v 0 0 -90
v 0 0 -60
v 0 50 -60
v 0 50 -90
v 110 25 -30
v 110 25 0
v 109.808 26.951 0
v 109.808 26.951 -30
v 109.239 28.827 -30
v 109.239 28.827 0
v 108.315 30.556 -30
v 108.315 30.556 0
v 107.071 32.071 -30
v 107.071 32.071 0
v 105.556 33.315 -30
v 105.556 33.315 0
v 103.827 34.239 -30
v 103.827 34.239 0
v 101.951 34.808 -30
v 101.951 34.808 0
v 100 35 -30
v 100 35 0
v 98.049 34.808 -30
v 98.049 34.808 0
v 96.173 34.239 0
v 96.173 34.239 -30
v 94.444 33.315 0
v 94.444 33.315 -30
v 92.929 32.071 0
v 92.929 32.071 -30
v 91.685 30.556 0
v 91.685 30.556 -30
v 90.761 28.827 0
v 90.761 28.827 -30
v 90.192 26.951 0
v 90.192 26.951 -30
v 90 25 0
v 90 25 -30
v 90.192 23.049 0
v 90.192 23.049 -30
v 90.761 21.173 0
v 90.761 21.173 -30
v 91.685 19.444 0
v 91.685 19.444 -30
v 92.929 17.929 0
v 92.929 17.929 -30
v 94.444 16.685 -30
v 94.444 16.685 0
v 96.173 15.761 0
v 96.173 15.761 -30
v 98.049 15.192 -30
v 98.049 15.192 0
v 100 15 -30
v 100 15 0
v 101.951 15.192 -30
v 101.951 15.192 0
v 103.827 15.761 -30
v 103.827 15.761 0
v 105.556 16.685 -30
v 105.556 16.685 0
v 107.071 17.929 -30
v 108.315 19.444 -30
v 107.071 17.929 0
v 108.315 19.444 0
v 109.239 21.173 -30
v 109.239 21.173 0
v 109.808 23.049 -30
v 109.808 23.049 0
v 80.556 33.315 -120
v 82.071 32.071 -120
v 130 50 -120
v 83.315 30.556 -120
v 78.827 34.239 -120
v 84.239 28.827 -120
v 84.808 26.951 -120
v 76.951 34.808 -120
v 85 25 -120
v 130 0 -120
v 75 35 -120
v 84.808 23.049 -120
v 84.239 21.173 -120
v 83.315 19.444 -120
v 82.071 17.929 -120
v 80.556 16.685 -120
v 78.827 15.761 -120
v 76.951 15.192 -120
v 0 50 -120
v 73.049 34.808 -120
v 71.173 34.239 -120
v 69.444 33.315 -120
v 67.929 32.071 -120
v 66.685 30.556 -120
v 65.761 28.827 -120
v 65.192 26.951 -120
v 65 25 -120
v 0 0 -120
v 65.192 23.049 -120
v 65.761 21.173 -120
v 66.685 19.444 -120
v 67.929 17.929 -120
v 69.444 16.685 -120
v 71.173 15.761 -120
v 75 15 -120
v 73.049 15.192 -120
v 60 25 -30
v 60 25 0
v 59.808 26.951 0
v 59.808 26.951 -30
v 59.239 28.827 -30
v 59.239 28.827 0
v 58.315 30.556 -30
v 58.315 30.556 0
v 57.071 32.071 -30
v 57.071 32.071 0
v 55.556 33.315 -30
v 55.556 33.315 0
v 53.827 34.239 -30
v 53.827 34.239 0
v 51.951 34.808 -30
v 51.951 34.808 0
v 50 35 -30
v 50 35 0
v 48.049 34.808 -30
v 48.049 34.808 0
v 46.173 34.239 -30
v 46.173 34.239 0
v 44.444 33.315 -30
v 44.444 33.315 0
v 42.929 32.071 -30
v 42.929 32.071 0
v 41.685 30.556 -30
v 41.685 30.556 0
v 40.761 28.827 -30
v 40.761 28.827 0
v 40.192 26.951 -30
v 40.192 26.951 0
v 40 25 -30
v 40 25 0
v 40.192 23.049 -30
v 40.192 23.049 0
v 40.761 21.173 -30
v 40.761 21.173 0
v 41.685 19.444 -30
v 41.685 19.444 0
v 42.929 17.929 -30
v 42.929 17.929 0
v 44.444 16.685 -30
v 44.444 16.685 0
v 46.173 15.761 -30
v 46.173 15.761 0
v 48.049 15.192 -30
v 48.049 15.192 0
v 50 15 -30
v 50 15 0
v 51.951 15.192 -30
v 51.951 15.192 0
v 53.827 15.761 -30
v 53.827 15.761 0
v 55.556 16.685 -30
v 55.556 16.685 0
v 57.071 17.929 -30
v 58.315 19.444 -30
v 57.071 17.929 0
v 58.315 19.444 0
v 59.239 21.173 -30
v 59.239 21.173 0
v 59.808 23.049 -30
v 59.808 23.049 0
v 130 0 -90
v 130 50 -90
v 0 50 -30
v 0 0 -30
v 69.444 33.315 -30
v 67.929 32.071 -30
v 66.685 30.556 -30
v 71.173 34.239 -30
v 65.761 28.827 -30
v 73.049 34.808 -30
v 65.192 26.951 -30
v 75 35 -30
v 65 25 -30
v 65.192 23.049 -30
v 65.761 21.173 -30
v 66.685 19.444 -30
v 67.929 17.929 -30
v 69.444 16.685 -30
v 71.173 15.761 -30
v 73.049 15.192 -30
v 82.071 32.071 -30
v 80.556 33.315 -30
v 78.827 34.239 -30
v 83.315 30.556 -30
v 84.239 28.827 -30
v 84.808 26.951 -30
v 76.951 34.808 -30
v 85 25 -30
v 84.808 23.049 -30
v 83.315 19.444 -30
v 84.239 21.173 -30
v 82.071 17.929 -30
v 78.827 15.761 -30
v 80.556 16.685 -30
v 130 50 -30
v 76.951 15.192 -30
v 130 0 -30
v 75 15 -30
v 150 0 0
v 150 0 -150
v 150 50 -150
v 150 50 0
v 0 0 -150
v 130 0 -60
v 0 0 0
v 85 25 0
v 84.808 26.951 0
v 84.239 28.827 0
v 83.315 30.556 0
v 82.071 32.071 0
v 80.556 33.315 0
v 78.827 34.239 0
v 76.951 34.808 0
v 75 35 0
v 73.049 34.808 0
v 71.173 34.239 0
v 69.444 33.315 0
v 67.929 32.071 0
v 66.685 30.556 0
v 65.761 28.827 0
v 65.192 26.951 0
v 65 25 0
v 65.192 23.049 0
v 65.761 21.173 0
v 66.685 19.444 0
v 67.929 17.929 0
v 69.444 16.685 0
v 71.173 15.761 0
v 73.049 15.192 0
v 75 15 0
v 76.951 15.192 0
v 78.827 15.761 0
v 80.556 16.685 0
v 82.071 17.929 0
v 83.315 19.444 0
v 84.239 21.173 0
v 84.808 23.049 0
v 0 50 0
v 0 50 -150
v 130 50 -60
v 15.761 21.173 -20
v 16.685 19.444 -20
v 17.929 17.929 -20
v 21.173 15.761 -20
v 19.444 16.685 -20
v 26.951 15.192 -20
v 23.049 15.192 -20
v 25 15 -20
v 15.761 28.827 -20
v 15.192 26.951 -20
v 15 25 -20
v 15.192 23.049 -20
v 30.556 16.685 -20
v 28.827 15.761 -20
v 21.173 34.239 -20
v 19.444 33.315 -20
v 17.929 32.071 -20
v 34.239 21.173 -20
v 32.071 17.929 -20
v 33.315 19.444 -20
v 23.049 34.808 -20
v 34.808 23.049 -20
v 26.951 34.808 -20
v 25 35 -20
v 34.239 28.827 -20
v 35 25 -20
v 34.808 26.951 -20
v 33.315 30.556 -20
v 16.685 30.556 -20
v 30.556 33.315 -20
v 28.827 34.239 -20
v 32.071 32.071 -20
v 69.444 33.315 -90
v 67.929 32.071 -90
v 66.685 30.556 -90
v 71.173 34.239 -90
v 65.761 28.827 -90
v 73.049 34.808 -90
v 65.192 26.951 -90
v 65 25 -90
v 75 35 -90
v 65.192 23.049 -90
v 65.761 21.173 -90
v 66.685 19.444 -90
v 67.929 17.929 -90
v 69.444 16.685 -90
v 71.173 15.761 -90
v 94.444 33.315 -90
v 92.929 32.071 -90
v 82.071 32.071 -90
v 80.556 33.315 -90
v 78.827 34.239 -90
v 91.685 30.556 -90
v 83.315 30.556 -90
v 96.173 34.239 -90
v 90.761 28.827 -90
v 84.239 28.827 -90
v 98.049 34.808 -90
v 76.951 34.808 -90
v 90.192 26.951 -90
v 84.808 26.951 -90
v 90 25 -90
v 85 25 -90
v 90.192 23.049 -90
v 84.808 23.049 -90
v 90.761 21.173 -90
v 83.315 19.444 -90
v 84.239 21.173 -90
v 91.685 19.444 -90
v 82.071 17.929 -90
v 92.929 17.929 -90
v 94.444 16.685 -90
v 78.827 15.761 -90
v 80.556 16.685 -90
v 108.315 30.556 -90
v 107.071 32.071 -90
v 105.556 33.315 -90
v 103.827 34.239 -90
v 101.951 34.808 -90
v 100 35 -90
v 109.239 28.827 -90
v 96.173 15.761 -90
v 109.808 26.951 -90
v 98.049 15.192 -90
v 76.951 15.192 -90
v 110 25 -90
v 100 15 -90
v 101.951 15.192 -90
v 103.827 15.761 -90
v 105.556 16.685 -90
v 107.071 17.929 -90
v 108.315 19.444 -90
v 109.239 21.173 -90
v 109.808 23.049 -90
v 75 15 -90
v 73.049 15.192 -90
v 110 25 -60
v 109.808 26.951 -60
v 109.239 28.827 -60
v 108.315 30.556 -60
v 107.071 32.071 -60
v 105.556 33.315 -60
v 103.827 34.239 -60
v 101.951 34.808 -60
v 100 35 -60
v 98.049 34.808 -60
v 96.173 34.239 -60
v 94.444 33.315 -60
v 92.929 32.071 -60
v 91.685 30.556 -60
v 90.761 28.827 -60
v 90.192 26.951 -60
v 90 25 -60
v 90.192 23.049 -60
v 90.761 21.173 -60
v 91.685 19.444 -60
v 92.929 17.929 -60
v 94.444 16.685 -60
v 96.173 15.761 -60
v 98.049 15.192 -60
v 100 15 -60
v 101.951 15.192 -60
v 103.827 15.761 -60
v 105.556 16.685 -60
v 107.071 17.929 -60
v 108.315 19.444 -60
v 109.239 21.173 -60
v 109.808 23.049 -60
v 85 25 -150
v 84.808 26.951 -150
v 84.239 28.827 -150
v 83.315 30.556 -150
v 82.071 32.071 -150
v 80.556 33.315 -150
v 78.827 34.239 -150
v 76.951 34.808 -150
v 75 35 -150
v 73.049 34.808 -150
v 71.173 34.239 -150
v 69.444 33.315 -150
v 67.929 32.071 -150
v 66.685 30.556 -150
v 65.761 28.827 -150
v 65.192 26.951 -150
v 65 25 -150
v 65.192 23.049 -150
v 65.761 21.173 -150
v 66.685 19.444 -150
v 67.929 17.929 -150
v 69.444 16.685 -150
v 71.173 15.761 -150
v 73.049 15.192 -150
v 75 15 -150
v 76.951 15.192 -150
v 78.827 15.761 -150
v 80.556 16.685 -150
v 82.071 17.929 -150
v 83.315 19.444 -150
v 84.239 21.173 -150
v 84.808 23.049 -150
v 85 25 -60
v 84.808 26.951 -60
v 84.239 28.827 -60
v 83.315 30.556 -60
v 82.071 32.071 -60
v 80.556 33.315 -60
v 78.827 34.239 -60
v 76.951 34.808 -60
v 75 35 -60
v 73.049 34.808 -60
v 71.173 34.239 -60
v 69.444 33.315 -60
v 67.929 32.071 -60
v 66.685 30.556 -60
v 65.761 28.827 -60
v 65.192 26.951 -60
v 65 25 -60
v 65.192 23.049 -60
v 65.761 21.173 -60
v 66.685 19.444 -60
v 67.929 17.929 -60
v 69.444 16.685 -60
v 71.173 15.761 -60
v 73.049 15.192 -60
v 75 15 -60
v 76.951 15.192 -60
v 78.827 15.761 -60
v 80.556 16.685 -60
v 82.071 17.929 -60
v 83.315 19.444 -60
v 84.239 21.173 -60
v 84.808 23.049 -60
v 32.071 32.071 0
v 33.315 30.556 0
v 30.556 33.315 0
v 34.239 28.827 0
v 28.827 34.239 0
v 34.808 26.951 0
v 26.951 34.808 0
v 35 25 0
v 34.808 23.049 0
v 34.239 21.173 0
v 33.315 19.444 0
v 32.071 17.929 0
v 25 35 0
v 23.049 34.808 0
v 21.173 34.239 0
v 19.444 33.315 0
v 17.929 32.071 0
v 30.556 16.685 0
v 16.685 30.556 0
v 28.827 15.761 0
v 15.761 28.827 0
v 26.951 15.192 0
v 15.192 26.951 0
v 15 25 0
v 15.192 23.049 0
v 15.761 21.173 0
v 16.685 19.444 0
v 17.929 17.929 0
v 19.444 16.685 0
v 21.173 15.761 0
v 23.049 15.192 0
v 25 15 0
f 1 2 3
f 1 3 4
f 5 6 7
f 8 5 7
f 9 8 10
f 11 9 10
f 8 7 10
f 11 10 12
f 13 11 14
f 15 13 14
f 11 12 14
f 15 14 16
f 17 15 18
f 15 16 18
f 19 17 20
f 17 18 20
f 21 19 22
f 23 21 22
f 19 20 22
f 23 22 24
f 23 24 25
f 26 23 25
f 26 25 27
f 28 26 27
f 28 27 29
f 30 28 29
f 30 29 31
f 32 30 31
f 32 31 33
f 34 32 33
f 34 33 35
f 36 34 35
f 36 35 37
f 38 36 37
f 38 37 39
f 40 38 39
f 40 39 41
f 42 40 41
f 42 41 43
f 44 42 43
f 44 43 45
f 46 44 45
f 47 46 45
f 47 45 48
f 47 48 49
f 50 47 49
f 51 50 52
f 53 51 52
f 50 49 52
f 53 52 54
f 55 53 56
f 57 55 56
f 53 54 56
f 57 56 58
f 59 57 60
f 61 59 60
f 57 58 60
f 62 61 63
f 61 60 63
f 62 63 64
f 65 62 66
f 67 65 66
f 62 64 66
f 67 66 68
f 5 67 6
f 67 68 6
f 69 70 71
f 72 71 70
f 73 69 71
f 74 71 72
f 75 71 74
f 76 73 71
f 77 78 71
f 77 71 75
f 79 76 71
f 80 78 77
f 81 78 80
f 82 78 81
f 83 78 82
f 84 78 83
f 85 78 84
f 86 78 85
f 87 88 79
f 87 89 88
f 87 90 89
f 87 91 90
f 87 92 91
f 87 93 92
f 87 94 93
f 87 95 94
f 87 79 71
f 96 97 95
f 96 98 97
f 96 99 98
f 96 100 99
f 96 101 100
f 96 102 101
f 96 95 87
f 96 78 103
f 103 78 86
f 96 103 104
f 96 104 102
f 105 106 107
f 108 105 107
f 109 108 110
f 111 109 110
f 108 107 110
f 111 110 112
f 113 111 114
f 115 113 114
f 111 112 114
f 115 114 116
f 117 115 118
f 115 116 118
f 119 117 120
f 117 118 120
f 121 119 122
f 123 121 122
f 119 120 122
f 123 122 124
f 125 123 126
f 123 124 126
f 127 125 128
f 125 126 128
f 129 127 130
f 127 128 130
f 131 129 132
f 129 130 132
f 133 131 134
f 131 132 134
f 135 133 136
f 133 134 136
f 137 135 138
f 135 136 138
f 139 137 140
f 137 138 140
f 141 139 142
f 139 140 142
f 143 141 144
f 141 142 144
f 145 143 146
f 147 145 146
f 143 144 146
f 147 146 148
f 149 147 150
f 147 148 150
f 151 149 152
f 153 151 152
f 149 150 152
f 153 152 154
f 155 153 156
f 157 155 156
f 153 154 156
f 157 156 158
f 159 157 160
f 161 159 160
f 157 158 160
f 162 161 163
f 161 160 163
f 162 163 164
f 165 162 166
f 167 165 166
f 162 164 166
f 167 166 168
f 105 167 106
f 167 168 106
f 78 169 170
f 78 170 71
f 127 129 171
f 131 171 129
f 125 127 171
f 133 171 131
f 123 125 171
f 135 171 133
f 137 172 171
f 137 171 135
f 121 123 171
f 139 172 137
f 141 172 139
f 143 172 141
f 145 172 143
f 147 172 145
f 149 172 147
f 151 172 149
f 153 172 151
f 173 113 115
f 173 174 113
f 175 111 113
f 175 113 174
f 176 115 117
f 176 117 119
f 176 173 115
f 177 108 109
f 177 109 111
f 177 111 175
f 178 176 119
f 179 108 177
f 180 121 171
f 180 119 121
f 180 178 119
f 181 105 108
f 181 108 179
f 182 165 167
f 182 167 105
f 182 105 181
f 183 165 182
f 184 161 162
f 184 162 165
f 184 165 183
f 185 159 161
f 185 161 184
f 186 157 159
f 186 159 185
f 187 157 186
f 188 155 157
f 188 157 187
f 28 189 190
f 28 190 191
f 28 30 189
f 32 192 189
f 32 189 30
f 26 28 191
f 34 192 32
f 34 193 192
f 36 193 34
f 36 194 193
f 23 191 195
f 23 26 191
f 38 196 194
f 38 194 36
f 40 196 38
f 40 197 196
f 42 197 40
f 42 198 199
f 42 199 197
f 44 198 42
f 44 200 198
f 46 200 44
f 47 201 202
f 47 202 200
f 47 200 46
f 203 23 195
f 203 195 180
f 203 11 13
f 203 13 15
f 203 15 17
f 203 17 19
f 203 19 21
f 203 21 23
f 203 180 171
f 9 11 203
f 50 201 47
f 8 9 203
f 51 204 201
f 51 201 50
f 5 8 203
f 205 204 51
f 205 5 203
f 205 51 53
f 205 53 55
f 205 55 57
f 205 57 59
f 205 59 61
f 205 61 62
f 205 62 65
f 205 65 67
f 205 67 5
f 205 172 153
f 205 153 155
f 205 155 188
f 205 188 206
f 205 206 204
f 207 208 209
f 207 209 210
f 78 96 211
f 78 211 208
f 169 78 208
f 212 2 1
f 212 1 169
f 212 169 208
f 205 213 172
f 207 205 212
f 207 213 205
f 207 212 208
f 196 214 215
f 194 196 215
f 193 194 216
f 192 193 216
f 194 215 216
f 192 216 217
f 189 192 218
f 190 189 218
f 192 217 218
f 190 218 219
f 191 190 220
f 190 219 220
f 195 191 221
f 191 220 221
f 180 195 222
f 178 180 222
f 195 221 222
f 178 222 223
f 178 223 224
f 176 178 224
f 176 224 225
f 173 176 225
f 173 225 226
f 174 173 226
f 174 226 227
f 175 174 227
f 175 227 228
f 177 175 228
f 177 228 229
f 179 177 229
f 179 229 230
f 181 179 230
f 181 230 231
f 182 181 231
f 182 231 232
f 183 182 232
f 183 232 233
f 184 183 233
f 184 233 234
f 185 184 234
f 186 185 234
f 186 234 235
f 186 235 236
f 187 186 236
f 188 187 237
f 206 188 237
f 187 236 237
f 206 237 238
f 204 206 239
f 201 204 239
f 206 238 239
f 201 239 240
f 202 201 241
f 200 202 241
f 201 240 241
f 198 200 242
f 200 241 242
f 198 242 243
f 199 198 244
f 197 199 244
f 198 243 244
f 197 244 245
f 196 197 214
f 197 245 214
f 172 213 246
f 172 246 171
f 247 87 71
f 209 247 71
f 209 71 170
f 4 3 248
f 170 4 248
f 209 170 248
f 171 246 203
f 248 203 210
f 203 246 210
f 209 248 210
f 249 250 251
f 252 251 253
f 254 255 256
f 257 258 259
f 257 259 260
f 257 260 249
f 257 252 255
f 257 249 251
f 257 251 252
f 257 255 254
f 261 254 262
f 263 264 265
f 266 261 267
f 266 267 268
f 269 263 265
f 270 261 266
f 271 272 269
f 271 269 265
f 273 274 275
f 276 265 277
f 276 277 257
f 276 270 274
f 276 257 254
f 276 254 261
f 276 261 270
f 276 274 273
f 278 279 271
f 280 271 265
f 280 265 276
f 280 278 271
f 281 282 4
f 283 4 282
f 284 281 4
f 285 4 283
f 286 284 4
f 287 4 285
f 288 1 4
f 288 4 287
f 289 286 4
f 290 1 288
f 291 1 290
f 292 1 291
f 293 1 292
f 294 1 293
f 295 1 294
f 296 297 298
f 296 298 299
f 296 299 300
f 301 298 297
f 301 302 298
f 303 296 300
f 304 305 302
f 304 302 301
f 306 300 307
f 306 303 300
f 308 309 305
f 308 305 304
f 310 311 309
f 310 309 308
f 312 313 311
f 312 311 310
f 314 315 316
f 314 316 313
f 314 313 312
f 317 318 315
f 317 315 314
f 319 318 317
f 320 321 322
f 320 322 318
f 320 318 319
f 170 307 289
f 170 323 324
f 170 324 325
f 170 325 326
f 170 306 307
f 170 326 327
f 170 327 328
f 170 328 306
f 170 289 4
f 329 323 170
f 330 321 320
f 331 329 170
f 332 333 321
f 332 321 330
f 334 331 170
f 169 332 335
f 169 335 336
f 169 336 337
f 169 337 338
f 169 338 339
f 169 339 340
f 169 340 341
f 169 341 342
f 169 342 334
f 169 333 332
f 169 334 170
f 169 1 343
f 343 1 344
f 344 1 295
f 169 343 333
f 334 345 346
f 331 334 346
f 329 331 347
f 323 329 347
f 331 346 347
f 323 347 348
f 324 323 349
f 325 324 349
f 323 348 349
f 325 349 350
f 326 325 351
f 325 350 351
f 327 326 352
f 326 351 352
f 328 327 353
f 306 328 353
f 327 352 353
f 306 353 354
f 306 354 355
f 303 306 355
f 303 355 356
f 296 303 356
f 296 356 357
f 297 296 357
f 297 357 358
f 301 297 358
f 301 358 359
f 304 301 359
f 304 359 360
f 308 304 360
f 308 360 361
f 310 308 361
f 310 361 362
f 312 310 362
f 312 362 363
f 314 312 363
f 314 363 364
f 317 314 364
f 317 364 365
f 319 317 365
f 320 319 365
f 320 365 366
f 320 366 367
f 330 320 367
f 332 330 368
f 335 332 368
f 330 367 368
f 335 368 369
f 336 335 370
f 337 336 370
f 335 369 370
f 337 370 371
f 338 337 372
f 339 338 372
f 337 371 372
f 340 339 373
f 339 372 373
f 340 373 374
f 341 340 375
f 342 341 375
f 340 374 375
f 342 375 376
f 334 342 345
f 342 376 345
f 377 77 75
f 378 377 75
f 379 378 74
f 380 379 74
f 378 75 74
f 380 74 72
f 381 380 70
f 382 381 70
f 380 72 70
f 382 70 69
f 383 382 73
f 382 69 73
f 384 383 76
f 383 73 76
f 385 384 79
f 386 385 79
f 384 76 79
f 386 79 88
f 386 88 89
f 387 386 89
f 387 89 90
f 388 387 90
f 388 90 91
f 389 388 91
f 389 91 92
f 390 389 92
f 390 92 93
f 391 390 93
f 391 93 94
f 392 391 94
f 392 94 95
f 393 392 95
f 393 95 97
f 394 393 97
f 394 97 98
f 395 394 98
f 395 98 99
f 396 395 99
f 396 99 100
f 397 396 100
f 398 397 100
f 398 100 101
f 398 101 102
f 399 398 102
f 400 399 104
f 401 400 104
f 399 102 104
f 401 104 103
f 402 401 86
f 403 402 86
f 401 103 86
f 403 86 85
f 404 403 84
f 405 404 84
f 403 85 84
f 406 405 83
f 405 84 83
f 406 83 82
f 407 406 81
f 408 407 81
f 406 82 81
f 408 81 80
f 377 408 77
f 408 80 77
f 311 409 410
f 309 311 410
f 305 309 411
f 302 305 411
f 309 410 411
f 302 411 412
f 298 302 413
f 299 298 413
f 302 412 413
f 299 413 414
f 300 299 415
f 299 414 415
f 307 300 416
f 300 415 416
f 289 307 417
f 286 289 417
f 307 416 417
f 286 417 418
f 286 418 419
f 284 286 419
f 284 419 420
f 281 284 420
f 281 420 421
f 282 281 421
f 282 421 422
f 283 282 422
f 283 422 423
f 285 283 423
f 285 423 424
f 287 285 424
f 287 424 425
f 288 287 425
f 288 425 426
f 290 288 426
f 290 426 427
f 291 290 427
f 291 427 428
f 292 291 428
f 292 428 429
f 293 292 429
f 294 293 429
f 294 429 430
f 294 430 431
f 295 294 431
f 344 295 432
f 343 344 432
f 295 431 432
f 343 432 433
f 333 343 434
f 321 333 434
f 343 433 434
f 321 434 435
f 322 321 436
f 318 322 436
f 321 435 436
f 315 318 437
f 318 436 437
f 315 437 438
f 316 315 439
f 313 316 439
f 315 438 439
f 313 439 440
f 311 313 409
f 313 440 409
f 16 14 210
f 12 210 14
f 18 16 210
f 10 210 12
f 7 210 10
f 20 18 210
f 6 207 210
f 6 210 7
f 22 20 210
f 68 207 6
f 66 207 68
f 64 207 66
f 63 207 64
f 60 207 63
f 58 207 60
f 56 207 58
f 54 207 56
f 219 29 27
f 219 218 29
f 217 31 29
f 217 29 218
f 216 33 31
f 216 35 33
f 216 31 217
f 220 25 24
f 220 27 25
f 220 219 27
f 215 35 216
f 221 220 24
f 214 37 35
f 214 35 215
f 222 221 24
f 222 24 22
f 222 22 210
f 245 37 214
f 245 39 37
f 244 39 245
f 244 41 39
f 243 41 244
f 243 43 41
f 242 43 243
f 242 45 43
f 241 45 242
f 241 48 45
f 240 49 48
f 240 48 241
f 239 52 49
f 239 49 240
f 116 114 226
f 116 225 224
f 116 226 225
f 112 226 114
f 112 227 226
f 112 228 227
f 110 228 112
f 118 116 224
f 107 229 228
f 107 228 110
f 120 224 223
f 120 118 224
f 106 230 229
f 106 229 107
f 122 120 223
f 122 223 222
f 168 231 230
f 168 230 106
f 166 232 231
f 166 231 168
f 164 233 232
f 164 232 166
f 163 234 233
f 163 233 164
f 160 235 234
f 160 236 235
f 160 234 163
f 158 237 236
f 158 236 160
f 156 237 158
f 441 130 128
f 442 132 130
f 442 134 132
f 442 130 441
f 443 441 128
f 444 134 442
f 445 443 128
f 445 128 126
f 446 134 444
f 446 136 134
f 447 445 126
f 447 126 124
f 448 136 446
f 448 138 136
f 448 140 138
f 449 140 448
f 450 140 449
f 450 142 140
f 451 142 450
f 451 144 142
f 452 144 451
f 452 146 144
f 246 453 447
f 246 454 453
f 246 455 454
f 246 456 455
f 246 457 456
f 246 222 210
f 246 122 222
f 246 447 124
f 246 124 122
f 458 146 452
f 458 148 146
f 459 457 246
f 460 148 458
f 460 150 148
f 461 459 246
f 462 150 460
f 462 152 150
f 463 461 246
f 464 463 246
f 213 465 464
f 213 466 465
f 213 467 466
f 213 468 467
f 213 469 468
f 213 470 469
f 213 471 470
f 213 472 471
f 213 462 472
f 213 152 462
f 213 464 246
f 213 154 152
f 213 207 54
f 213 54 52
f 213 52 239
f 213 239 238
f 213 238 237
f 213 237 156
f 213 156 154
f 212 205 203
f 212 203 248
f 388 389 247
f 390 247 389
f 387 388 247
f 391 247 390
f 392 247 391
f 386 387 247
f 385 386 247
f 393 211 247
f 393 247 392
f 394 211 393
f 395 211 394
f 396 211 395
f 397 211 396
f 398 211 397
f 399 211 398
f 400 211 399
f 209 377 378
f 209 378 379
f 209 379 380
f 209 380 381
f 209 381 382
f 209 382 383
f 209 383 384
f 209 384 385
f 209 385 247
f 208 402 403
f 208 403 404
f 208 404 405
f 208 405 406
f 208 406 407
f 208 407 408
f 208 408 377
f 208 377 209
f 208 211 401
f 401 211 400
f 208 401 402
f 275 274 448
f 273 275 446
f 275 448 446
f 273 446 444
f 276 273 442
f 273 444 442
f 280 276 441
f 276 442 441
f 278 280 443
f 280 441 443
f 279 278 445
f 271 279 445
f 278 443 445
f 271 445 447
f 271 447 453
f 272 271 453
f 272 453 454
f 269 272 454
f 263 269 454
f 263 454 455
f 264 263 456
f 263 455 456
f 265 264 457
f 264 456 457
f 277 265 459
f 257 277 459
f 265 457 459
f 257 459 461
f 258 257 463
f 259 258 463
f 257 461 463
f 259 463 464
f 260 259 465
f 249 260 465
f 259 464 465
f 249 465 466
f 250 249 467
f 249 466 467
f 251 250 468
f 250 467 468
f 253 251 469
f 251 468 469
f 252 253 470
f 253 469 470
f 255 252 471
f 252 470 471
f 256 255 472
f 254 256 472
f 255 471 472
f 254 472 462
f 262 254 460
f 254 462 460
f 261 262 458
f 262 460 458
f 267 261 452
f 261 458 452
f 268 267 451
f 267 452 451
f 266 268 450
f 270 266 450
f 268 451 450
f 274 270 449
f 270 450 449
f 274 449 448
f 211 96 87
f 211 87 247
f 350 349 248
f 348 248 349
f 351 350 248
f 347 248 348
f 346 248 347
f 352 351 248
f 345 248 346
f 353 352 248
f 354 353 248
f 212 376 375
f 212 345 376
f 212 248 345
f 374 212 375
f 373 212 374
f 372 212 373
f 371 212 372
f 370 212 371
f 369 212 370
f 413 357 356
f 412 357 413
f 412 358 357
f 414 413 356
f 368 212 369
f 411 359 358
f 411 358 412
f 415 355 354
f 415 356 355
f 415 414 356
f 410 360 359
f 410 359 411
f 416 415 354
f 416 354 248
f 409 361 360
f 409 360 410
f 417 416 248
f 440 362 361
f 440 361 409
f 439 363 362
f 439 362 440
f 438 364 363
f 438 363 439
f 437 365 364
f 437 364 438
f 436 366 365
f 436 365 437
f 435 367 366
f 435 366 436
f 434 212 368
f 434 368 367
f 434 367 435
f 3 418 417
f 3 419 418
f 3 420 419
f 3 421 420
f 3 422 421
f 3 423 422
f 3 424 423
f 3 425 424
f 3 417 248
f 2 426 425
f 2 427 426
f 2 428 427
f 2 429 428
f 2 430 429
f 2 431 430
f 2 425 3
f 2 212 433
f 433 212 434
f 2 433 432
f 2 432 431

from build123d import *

# Parameters (mm, degrees)
F1_DEPTH = 50
F4_R     = 10
F5_DEPTH = 20
F6_DEPTH = 30
F7_DEPTH = 150.001
F8_DEPTH = 90


with BuildPart() as f1:
    # F0 (on Front) → F1 (new body)
    with BuildSketch(Plane.XZ):
        Polygon((150, 0), (0, 0), (0, -30), (130, -30), (130, -60), (0, -60), (0, -90), (130, -90), (130, -120), (0, -120), (0, -150), (150, -150), align=None)
    extrude(amount=-F1_DEPTH)

    # F4 (on Top) → F5 (cut)
    with BuildSketch(Plane.XY):
        with Locations((25, 25)):
            Circle(F4_R)
    extrude(amount=-F5_DEPTH, mode=Mode.SUBTRACT)

    # F4 (on Top) → F6 (cut, through all)
    with BuildSketch(Plane.XY):
        with Locations((50, 25)):
            Circle(F4_R)
    extrude(amount=-F6_DEPTH, mode=Mode.SUBTRACT)

    # F4 (on Top) → F7 (cut, through all)
    with BuildSketch(Plane.XY):
        with Locations((75, 25)):
            Circle(F4_R)
    extrude(amount=-F7_DEPTH, mode=Mode.SUBTRACT)

    # F4 (on Top) → F8 (cut, through all)
    with BuildSketch(Plane.XY):
        with Locations((100, 25)):
            Circle(F4_R)
    extrude(amount=-F8_DEPTH, mode=Mode.SUBTRACT)


solid = f1.part
